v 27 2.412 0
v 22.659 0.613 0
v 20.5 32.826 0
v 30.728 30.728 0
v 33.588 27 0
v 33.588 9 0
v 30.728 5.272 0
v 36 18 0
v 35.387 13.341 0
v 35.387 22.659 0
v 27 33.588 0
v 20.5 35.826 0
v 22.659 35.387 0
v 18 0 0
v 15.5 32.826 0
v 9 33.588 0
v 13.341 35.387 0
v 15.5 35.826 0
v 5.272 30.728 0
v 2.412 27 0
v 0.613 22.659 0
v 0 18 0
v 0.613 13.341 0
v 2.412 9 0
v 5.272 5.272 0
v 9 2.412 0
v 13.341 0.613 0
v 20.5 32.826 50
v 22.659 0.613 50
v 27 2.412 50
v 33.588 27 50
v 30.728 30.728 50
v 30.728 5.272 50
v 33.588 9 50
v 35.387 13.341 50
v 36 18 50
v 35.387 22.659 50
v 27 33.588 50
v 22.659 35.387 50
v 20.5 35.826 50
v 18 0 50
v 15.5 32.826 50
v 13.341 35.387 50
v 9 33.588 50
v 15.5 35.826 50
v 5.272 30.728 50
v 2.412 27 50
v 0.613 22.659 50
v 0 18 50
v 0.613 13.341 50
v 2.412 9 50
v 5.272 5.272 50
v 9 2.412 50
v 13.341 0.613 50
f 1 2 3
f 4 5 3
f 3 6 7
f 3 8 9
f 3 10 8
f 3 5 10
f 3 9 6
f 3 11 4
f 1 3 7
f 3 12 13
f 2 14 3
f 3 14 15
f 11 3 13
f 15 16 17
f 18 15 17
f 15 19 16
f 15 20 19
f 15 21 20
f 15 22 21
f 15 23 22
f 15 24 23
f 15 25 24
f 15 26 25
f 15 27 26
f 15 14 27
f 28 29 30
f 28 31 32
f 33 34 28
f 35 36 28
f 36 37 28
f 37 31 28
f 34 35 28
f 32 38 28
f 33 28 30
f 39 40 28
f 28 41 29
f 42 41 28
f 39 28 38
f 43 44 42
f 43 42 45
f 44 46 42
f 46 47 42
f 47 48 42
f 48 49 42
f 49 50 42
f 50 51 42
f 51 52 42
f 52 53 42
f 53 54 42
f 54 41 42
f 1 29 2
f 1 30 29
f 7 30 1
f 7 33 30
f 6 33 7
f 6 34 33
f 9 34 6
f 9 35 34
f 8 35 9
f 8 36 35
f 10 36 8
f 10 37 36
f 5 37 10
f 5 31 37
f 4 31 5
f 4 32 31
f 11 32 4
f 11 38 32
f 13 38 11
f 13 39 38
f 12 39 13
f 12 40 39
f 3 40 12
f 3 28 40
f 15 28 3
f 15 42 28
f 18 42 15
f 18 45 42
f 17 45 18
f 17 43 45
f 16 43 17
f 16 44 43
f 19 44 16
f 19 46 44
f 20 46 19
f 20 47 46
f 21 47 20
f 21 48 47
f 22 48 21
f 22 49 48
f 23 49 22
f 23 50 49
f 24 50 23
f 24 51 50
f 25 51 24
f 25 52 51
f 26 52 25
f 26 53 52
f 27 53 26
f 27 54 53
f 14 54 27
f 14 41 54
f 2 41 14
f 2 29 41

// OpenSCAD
$fn = 32;

// ----------------------------------------------------------------------
// Keyway shaft: d36 shaft, key 5 x 3 mm
// ----------------------------------------------------------------------

// --- parameters (mm) ---
shaft_r = 18;             // shaft radius
key_w = 5;                // keyway width
key_d = 3;                // keyway depth below the surface line
plate_t = 50;             // shaft length, Z (extrusion height)

shaft_d = 2 * shaft_r;  // shaft diameter
circle_step = 15;  // polygon sampling step, degrees

profile = [[13.341, 35.387], [9, 33.588], [5.272, 30.728], [2.412, 27], [0.613, 22.659], [0, 18], [0.613, 13.341], [2.412, 9], [5.272, 5.272], [9, 2.412], [13.341, 0.613], [18, 0], [22.659, 0.613], [27, 2.412], [30.728, 5.272], [33.588, 9], [35.387, 13.341], [36, 18], [35.387, 22.659], [33.588, 27], [30.728, 30.728], [27, 33.588], [22.659, 35.387], [20.5, 35.826], [20.5, 32.826], [15.5, 32.826], [15.5, 35.826]];  // primary outline, 27 points, counter clockwise

// --- the one profile operation ---
linear_extrude(height = plate_t) polygon(points = profile);
